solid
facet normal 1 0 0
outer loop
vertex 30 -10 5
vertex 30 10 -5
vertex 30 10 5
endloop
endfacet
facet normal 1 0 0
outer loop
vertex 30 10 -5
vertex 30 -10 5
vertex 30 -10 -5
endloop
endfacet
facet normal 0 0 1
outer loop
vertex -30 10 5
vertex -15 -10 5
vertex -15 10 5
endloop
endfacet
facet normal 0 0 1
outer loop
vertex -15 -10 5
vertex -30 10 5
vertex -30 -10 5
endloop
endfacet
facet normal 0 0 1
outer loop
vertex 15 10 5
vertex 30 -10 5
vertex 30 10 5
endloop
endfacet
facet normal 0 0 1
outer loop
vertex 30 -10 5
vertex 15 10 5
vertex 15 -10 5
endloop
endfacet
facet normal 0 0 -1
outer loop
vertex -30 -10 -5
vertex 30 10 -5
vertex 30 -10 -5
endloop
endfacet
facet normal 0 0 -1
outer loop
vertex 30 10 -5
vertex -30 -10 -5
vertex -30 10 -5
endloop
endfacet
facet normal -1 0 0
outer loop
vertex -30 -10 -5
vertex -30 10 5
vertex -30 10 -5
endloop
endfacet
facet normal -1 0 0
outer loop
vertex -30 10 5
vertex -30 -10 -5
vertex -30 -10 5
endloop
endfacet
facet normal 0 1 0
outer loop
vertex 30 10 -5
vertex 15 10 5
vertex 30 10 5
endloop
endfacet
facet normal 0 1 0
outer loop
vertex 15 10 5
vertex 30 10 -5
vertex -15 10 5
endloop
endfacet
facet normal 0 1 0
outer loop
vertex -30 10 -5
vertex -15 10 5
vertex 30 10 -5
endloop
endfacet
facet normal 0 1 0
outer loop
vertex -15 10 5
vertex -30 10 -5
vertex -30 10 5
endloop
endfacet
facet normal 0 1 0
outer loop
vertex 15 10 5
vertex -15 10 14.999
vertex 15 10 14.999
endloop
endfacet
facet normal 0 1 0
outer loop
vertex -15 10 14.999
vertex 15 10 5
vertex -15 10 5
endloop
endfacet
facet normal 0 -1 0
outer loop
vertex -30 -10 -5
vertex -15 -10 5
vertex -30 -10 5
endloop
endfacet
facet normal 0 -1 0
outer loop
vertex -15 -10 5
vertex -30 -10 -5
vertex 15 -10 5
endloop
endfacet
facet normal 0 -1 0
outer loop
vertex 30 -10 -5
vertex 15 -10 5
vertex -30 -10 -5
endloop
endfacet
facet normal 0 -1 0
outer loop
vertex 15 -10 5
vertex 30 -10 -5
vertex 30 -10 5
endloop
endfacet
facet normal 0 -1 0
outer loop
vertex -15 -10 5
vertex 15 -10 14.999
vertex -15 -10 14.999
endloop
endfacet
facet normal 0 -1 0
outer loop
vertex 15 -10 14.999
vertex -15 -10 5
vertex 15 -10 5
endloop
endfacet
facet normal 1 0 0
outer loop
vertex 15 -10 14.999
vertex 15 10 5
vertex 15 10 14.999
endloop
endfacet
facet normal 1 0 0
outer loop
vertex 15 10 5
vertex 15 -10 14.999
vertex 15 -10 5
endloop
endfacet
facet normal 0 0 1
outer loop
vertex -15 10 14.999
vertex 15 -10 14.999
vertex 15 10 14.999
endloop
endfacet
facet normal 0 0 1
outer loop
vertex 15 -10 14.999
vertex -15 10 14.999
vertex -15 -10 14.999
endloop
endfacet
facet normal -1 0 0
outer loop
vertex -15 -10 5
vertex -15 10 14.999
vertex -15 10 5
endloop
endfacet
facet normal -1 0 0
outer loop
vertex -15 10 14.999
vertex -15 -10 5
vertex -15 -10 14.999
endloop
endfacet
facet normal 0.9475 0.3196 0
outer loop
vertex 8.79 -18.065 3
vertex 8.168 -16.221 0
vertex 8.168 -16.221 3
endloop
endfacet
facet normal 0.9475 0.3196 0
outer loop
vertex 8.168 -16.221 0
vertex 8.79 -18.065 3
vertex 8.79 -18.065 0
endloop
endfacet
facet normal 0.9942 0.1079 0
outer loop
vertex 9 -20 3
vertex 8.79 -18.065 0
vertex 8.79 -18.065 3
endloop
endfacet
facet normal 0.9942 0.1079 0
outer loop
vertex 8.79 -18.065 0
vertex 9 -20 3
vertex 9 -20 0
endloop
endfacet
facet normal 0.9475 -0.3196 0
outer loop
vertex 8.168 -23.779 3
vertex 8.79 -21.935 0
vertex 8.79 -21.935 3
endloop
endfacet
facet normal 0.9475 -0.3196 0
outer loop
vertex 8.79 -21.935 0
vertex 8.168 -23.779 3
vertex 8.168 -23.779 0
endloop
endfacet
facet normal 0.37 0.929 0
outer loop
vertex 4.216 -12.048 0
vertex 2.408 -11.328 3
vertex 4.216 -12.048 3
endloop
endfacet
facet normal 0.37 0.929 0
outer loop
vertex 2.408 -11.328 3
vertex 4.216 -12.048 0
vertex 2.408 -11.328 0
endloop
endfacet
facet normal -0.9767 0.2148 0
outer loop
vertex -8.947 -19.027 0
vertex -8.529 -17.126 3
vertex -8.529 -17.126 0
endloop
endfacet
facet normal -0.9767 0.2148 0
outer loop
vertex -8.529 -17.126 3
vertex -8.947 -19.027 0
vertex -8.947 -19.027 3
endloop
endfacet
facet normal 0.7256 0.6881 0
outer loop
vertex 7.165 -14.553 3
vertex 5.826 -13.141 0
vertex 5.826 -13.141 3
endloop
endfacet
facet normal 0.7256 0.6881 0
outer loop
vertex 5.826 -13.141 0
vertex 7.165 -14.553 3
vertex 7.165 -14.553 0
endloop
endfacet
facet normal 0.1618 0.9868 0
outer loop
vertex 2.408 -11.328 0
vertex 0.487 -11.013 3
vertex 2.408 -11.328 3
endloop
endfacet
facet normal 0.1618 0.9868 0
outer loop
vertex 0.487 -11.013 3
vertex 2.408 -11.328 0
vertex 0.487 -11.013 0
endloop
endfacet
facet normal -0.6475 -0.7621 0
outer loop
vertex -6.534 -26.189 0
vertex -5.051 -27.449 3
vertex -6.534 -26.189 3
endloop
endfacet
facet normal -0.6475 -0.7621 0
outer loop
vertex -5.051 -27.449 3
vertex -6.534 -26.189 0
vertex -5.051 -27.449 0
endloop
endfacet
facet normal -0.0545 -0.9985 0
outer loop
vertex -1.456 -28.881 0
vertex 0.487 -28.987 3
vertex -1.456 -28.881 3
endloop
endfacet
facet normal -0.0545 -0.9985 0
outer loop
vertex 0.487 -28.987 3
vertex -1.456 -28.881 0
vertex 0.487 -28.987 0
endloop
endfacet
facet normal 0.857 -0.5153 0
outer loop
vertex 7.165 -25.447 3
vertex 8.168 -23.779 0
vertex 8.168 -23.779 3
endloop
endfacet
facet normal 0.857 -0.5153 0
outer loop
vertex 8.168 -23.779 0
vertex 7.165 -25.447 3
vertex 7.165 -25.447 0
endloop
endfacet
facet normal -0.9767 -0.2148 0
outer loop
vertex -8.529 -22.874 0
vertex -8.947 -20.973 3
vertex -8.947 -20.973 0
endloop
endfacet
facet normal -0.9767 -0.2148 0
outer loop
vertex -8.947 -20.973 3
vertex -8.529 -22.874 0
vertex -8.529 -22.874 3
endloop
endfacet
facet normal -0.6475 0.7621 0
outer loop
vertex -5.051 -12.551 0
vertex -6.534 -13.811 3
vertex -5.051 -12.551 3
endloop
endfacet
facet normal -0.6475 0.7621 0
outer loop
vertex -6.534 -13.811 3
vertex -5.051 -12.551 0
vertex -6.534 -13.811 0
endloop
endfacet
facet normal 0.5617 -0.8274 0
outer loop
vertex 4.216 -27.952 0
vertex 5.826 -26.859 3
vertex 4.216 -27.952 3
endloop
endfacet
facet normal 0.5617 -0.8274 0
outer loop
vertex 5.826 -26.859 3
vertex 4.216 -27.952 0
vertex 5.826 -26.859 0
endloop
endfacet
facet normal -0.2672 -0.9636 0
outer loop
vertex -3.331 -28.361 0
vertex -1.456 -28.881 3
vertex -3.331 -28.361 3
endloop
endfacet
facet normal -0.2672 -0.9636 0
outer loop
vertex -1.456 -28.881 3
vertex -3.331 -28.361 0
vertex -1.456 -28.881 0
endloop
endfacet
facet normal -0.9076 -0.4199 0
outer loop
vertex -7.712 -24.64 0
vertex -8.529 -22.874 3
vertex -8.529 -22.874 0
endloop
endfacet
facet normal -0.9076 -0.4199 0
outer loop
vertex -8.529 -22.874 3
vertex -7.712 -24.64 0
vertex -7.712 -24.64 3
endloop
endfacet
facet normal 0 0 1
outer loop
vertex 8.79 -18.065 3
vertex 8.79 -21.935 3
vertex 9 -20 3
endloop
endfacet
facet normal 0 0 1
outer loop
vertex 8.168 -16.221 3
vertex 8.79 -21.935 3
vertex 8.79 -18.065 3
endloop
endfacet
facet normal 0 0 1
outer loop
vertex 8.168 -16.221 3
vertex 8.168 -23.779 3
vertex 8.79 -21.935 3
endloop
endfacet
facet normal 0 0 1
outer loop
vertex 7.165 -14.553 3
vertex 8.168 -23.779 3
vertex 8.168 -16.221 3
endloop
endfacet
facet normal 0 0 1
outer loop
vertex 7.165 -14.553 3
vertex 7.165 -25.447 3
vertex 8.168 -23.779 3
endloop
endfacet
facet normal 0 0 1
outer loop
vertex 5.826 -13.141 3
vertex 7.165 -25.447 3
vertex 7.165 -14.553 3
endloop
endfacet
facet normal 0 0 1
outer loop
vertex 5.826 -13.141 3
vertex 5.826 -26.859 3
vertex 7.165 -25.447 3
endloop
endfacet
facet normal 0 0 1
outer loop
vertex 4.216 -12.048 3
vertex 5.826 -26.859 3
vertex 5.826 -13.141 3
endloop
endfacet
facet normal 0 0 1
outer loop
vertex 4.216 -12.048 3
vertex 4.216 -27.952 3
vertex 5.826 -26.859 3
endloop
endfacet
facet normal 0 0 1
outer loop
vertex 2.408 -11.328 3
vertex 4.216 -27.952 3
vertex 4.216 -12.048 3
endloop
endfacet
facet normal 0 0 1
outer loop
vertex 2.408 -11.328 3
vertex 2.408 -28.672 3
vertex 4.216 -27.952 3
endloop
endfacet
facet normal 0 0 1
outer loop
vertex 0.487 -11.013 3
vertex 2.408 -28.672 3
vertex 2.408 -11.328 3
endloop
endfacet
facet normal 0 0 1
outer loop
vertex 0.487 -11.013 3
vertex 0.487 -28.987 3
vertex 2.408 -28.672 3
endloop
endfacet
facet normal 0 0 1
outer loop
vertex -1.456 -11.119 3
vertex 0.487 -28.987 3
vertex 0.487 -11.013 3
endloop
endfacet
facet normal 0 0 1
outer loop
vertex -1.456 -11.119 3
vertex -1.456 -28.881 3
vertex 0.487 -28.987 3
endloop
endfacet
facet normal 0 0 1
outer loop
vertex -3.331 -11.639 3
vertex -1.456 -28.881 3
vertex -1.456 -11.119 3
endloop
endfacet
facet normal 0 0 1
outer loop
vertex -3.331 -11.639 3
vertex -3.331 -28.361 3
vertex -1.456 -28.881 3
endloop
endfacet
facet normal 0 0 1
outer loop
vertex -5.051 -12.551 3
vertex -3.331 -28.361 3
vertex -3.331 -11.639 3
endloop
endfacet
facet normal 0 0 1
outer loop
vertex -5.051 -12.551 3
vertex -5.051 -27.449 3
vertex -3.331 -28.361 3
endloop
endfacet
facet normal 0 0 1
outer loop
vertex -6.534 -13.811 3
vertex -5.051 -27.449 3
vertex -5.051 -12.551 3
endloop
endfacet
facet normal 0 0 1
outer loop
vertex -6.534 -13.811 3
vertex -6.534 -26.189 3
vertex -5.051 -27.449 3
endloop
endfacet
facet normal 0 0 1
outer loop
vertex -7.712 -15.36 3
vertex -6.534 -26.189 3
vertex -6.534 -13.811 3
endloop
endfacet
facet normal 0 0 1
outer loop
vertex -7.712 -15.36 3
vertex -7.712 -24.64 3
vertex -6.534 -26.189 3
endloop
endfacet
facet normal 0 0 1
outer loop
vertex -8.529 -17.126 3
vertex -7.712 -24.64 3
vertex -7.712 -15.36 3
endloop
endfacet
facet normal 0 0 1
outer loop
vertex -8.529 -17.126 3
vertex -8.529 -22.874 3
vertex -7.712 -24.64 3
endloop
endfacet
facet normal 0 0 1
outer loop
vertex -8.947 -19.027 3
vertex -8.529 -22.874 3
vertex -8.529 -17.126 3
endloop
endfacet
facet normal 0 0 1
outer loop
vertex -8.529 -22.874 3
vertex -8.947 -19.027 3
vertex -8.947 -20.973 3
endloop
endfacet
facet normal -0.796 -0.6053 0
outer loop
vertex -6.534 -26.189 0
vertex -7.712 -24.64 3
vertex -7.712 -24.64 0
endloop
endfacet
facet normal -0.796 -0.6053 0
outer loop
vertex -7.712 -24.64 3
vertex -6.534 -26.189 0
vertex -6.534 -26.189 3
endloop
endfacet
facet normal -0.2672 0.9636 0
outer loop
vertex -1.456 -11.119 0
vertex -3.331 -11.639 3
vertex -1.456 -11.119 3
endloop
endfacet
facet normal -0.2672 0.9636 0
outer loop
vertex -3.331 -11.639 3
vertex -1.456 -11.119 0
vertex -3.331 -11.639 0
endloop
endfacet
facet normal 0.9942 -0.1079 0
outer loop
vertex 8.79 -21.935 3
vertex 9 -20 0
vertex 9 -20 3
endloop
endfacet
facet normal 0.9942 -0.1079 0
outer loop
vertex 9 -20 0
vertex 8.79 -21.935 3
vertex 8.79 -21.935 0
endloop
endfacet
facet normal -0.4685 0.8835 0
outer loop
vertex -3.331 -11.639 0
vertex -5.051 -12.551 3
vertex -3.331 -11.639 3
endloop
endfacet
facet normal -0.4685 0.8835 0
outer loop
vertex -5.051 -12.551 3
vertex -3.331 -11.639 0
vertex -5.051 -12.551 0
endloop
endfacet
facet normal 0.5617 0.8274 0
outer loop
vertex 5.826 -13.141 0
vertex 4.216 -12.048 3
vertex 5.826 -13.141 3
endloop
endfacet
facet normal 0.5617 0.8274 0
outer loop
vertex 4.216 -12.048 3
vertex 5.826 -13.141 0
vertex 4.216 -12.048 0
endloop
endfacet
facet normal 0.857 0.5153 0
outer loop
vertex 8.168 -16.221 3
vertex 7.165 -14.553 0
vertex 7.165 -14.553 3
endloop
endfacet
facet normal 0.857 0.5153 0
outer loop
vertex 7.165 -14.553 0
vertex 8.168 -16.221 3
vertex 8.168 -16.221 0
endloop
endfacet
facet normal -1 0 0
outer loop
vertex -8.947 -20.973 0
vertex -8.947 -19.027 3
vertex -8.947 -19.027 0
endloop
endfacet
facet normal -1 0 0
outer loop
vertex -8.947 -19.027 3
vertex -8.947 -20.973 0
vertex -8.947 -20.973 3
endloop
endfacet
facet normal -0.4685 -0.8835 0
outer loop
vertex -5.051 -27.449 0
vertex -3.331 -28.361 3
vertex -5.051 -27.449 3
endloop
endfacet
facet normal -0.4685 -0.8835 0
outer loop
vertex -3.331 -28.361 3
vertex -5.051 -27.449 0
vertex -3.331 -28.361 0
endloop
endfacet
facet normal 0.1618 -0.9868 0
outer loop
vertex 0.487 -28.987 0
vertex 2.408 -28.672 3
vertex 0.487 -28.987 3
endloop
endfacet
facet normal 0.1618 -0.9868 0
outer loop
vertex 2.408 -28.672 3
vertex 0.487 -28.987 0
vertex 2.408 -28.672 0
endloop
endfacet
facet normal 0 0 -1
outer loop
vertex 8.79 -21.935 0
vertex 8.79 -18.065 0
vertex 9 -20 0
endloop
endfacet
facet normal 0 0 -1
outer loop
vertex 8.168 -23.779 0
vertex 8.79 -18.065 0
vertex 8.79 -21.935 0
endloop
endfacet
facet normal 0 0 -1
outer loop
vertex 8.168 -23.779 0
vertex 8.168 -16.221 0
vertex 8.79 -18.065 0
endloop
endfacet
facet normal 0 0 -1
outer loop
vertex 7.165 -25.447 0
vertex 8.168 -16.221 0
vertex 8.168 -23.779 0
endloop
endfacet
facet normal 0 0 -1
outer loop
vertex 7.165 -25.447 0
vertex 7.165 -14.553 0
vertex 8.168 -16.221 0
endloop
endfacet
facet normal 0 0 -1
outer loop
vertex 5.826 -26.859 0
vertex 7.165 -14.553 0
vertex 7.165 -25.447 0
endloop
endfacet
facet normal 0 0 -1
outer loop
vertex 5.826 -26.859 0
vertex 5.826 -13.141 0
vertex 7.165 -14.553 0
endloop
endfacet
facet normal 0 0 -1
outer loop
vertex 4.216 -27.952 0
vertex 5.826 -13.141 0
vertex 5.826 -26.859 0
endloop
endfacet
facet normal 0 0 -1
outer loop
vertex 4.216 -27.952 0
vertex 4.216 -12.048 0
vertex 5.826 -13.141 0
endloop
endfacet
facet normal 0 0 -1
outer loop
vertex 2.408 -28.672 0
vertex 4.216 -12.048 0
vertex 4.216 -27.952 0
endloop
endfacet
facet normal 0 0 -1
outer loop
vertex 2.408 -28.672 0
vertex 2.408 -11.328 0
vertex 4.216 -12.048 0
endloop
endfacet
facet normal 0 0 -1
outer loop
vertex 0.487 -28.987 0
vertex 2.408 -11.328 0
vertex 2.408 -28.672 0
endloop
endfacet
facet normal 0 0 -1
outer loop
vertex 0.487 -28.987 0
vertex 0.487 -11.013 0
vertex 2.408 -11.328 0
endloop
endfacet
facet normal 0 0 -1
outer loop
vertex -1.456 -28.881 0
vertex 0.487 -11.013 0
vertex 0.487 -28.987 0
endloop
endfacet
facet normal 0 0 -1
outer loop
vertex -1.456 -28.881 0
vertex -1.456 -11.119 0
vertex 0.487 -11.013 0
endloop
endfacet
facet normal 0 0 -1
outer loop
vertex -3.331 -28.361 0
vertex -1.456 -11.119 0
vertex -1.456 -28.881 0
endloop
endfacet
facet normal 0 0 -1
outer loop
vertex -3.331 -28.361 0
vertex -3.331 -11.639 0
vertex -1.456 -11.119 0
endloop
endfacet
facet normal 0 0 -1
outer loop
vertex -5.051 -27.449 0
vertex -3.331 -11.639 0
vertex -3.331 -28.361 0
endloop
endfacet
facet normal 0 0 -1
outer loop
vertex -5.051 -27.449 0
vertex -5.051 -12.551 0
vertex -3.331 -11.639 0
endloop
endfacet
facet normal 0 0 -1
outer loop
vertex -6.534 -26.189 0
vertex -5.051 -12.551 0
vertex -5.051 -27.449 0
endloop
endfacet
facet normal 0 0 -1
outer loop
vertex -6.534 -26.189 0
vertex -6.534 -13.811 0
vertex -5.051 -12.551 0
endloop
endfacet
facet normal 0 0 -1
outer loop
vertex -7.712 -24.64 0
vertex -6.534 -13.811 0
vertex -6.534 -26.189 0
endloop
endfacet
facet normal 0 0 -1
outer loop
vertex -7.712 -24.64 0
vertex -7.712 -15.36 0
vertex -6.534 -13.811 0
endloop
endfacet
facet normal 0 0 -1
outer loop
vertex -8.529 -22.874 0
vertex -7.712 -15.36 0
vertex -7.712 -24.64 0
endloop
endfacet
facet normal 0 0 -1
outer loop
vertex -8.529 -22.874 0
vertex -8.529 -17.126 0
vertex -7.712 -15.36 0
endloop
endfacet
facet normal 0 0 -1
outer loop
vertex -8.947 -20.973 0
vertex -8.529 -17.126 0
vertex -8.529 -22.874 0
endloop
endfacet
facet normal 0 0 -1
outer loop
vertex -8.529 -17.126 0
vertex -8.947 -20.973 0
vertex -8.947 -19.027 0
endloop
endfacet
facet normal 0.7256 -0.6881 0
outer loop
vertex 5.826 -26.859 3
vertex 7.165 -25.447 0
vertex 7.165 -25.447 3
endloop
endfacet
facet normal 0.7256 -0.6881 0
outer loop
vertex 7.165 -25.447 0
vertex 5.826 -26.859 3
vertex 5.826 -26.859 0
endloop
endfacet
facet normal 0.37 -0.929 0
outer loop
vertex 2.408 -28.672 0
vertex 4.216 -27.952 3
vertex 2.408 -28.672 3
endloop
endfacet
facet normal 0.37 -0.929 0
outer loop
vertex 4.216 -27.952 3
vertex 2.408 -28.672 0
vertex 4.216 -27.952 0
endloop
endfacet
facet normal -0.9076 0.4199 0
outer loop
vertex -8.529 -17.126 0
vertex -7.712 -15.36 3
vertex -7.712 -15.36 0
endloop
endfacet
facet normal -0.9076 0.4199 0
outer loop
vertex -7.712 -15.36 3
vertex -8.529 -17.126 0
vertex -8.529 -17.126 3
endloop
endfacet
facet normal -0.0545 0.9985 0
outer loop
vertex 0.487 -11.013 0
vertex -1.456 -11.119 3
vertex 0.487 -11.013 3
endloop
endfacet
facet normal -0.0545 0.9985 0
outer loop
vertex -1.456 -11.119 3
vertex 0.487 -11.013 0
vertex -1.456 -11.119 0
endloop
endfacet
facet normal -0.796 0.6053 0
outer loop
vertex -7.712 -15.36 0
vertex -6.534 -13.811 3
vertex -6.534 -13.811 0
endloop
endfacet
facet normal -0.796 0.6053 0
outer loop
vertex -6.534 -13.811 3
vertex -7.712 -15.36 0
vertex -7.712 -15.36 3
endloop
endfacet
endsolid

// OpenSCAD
cube([60,20,10],center=true);
translate([0,0,10-0.001])
    cube([30,20,10],center=true);
translate([0,-20,0])
    cylinder(h=3, r=9);
